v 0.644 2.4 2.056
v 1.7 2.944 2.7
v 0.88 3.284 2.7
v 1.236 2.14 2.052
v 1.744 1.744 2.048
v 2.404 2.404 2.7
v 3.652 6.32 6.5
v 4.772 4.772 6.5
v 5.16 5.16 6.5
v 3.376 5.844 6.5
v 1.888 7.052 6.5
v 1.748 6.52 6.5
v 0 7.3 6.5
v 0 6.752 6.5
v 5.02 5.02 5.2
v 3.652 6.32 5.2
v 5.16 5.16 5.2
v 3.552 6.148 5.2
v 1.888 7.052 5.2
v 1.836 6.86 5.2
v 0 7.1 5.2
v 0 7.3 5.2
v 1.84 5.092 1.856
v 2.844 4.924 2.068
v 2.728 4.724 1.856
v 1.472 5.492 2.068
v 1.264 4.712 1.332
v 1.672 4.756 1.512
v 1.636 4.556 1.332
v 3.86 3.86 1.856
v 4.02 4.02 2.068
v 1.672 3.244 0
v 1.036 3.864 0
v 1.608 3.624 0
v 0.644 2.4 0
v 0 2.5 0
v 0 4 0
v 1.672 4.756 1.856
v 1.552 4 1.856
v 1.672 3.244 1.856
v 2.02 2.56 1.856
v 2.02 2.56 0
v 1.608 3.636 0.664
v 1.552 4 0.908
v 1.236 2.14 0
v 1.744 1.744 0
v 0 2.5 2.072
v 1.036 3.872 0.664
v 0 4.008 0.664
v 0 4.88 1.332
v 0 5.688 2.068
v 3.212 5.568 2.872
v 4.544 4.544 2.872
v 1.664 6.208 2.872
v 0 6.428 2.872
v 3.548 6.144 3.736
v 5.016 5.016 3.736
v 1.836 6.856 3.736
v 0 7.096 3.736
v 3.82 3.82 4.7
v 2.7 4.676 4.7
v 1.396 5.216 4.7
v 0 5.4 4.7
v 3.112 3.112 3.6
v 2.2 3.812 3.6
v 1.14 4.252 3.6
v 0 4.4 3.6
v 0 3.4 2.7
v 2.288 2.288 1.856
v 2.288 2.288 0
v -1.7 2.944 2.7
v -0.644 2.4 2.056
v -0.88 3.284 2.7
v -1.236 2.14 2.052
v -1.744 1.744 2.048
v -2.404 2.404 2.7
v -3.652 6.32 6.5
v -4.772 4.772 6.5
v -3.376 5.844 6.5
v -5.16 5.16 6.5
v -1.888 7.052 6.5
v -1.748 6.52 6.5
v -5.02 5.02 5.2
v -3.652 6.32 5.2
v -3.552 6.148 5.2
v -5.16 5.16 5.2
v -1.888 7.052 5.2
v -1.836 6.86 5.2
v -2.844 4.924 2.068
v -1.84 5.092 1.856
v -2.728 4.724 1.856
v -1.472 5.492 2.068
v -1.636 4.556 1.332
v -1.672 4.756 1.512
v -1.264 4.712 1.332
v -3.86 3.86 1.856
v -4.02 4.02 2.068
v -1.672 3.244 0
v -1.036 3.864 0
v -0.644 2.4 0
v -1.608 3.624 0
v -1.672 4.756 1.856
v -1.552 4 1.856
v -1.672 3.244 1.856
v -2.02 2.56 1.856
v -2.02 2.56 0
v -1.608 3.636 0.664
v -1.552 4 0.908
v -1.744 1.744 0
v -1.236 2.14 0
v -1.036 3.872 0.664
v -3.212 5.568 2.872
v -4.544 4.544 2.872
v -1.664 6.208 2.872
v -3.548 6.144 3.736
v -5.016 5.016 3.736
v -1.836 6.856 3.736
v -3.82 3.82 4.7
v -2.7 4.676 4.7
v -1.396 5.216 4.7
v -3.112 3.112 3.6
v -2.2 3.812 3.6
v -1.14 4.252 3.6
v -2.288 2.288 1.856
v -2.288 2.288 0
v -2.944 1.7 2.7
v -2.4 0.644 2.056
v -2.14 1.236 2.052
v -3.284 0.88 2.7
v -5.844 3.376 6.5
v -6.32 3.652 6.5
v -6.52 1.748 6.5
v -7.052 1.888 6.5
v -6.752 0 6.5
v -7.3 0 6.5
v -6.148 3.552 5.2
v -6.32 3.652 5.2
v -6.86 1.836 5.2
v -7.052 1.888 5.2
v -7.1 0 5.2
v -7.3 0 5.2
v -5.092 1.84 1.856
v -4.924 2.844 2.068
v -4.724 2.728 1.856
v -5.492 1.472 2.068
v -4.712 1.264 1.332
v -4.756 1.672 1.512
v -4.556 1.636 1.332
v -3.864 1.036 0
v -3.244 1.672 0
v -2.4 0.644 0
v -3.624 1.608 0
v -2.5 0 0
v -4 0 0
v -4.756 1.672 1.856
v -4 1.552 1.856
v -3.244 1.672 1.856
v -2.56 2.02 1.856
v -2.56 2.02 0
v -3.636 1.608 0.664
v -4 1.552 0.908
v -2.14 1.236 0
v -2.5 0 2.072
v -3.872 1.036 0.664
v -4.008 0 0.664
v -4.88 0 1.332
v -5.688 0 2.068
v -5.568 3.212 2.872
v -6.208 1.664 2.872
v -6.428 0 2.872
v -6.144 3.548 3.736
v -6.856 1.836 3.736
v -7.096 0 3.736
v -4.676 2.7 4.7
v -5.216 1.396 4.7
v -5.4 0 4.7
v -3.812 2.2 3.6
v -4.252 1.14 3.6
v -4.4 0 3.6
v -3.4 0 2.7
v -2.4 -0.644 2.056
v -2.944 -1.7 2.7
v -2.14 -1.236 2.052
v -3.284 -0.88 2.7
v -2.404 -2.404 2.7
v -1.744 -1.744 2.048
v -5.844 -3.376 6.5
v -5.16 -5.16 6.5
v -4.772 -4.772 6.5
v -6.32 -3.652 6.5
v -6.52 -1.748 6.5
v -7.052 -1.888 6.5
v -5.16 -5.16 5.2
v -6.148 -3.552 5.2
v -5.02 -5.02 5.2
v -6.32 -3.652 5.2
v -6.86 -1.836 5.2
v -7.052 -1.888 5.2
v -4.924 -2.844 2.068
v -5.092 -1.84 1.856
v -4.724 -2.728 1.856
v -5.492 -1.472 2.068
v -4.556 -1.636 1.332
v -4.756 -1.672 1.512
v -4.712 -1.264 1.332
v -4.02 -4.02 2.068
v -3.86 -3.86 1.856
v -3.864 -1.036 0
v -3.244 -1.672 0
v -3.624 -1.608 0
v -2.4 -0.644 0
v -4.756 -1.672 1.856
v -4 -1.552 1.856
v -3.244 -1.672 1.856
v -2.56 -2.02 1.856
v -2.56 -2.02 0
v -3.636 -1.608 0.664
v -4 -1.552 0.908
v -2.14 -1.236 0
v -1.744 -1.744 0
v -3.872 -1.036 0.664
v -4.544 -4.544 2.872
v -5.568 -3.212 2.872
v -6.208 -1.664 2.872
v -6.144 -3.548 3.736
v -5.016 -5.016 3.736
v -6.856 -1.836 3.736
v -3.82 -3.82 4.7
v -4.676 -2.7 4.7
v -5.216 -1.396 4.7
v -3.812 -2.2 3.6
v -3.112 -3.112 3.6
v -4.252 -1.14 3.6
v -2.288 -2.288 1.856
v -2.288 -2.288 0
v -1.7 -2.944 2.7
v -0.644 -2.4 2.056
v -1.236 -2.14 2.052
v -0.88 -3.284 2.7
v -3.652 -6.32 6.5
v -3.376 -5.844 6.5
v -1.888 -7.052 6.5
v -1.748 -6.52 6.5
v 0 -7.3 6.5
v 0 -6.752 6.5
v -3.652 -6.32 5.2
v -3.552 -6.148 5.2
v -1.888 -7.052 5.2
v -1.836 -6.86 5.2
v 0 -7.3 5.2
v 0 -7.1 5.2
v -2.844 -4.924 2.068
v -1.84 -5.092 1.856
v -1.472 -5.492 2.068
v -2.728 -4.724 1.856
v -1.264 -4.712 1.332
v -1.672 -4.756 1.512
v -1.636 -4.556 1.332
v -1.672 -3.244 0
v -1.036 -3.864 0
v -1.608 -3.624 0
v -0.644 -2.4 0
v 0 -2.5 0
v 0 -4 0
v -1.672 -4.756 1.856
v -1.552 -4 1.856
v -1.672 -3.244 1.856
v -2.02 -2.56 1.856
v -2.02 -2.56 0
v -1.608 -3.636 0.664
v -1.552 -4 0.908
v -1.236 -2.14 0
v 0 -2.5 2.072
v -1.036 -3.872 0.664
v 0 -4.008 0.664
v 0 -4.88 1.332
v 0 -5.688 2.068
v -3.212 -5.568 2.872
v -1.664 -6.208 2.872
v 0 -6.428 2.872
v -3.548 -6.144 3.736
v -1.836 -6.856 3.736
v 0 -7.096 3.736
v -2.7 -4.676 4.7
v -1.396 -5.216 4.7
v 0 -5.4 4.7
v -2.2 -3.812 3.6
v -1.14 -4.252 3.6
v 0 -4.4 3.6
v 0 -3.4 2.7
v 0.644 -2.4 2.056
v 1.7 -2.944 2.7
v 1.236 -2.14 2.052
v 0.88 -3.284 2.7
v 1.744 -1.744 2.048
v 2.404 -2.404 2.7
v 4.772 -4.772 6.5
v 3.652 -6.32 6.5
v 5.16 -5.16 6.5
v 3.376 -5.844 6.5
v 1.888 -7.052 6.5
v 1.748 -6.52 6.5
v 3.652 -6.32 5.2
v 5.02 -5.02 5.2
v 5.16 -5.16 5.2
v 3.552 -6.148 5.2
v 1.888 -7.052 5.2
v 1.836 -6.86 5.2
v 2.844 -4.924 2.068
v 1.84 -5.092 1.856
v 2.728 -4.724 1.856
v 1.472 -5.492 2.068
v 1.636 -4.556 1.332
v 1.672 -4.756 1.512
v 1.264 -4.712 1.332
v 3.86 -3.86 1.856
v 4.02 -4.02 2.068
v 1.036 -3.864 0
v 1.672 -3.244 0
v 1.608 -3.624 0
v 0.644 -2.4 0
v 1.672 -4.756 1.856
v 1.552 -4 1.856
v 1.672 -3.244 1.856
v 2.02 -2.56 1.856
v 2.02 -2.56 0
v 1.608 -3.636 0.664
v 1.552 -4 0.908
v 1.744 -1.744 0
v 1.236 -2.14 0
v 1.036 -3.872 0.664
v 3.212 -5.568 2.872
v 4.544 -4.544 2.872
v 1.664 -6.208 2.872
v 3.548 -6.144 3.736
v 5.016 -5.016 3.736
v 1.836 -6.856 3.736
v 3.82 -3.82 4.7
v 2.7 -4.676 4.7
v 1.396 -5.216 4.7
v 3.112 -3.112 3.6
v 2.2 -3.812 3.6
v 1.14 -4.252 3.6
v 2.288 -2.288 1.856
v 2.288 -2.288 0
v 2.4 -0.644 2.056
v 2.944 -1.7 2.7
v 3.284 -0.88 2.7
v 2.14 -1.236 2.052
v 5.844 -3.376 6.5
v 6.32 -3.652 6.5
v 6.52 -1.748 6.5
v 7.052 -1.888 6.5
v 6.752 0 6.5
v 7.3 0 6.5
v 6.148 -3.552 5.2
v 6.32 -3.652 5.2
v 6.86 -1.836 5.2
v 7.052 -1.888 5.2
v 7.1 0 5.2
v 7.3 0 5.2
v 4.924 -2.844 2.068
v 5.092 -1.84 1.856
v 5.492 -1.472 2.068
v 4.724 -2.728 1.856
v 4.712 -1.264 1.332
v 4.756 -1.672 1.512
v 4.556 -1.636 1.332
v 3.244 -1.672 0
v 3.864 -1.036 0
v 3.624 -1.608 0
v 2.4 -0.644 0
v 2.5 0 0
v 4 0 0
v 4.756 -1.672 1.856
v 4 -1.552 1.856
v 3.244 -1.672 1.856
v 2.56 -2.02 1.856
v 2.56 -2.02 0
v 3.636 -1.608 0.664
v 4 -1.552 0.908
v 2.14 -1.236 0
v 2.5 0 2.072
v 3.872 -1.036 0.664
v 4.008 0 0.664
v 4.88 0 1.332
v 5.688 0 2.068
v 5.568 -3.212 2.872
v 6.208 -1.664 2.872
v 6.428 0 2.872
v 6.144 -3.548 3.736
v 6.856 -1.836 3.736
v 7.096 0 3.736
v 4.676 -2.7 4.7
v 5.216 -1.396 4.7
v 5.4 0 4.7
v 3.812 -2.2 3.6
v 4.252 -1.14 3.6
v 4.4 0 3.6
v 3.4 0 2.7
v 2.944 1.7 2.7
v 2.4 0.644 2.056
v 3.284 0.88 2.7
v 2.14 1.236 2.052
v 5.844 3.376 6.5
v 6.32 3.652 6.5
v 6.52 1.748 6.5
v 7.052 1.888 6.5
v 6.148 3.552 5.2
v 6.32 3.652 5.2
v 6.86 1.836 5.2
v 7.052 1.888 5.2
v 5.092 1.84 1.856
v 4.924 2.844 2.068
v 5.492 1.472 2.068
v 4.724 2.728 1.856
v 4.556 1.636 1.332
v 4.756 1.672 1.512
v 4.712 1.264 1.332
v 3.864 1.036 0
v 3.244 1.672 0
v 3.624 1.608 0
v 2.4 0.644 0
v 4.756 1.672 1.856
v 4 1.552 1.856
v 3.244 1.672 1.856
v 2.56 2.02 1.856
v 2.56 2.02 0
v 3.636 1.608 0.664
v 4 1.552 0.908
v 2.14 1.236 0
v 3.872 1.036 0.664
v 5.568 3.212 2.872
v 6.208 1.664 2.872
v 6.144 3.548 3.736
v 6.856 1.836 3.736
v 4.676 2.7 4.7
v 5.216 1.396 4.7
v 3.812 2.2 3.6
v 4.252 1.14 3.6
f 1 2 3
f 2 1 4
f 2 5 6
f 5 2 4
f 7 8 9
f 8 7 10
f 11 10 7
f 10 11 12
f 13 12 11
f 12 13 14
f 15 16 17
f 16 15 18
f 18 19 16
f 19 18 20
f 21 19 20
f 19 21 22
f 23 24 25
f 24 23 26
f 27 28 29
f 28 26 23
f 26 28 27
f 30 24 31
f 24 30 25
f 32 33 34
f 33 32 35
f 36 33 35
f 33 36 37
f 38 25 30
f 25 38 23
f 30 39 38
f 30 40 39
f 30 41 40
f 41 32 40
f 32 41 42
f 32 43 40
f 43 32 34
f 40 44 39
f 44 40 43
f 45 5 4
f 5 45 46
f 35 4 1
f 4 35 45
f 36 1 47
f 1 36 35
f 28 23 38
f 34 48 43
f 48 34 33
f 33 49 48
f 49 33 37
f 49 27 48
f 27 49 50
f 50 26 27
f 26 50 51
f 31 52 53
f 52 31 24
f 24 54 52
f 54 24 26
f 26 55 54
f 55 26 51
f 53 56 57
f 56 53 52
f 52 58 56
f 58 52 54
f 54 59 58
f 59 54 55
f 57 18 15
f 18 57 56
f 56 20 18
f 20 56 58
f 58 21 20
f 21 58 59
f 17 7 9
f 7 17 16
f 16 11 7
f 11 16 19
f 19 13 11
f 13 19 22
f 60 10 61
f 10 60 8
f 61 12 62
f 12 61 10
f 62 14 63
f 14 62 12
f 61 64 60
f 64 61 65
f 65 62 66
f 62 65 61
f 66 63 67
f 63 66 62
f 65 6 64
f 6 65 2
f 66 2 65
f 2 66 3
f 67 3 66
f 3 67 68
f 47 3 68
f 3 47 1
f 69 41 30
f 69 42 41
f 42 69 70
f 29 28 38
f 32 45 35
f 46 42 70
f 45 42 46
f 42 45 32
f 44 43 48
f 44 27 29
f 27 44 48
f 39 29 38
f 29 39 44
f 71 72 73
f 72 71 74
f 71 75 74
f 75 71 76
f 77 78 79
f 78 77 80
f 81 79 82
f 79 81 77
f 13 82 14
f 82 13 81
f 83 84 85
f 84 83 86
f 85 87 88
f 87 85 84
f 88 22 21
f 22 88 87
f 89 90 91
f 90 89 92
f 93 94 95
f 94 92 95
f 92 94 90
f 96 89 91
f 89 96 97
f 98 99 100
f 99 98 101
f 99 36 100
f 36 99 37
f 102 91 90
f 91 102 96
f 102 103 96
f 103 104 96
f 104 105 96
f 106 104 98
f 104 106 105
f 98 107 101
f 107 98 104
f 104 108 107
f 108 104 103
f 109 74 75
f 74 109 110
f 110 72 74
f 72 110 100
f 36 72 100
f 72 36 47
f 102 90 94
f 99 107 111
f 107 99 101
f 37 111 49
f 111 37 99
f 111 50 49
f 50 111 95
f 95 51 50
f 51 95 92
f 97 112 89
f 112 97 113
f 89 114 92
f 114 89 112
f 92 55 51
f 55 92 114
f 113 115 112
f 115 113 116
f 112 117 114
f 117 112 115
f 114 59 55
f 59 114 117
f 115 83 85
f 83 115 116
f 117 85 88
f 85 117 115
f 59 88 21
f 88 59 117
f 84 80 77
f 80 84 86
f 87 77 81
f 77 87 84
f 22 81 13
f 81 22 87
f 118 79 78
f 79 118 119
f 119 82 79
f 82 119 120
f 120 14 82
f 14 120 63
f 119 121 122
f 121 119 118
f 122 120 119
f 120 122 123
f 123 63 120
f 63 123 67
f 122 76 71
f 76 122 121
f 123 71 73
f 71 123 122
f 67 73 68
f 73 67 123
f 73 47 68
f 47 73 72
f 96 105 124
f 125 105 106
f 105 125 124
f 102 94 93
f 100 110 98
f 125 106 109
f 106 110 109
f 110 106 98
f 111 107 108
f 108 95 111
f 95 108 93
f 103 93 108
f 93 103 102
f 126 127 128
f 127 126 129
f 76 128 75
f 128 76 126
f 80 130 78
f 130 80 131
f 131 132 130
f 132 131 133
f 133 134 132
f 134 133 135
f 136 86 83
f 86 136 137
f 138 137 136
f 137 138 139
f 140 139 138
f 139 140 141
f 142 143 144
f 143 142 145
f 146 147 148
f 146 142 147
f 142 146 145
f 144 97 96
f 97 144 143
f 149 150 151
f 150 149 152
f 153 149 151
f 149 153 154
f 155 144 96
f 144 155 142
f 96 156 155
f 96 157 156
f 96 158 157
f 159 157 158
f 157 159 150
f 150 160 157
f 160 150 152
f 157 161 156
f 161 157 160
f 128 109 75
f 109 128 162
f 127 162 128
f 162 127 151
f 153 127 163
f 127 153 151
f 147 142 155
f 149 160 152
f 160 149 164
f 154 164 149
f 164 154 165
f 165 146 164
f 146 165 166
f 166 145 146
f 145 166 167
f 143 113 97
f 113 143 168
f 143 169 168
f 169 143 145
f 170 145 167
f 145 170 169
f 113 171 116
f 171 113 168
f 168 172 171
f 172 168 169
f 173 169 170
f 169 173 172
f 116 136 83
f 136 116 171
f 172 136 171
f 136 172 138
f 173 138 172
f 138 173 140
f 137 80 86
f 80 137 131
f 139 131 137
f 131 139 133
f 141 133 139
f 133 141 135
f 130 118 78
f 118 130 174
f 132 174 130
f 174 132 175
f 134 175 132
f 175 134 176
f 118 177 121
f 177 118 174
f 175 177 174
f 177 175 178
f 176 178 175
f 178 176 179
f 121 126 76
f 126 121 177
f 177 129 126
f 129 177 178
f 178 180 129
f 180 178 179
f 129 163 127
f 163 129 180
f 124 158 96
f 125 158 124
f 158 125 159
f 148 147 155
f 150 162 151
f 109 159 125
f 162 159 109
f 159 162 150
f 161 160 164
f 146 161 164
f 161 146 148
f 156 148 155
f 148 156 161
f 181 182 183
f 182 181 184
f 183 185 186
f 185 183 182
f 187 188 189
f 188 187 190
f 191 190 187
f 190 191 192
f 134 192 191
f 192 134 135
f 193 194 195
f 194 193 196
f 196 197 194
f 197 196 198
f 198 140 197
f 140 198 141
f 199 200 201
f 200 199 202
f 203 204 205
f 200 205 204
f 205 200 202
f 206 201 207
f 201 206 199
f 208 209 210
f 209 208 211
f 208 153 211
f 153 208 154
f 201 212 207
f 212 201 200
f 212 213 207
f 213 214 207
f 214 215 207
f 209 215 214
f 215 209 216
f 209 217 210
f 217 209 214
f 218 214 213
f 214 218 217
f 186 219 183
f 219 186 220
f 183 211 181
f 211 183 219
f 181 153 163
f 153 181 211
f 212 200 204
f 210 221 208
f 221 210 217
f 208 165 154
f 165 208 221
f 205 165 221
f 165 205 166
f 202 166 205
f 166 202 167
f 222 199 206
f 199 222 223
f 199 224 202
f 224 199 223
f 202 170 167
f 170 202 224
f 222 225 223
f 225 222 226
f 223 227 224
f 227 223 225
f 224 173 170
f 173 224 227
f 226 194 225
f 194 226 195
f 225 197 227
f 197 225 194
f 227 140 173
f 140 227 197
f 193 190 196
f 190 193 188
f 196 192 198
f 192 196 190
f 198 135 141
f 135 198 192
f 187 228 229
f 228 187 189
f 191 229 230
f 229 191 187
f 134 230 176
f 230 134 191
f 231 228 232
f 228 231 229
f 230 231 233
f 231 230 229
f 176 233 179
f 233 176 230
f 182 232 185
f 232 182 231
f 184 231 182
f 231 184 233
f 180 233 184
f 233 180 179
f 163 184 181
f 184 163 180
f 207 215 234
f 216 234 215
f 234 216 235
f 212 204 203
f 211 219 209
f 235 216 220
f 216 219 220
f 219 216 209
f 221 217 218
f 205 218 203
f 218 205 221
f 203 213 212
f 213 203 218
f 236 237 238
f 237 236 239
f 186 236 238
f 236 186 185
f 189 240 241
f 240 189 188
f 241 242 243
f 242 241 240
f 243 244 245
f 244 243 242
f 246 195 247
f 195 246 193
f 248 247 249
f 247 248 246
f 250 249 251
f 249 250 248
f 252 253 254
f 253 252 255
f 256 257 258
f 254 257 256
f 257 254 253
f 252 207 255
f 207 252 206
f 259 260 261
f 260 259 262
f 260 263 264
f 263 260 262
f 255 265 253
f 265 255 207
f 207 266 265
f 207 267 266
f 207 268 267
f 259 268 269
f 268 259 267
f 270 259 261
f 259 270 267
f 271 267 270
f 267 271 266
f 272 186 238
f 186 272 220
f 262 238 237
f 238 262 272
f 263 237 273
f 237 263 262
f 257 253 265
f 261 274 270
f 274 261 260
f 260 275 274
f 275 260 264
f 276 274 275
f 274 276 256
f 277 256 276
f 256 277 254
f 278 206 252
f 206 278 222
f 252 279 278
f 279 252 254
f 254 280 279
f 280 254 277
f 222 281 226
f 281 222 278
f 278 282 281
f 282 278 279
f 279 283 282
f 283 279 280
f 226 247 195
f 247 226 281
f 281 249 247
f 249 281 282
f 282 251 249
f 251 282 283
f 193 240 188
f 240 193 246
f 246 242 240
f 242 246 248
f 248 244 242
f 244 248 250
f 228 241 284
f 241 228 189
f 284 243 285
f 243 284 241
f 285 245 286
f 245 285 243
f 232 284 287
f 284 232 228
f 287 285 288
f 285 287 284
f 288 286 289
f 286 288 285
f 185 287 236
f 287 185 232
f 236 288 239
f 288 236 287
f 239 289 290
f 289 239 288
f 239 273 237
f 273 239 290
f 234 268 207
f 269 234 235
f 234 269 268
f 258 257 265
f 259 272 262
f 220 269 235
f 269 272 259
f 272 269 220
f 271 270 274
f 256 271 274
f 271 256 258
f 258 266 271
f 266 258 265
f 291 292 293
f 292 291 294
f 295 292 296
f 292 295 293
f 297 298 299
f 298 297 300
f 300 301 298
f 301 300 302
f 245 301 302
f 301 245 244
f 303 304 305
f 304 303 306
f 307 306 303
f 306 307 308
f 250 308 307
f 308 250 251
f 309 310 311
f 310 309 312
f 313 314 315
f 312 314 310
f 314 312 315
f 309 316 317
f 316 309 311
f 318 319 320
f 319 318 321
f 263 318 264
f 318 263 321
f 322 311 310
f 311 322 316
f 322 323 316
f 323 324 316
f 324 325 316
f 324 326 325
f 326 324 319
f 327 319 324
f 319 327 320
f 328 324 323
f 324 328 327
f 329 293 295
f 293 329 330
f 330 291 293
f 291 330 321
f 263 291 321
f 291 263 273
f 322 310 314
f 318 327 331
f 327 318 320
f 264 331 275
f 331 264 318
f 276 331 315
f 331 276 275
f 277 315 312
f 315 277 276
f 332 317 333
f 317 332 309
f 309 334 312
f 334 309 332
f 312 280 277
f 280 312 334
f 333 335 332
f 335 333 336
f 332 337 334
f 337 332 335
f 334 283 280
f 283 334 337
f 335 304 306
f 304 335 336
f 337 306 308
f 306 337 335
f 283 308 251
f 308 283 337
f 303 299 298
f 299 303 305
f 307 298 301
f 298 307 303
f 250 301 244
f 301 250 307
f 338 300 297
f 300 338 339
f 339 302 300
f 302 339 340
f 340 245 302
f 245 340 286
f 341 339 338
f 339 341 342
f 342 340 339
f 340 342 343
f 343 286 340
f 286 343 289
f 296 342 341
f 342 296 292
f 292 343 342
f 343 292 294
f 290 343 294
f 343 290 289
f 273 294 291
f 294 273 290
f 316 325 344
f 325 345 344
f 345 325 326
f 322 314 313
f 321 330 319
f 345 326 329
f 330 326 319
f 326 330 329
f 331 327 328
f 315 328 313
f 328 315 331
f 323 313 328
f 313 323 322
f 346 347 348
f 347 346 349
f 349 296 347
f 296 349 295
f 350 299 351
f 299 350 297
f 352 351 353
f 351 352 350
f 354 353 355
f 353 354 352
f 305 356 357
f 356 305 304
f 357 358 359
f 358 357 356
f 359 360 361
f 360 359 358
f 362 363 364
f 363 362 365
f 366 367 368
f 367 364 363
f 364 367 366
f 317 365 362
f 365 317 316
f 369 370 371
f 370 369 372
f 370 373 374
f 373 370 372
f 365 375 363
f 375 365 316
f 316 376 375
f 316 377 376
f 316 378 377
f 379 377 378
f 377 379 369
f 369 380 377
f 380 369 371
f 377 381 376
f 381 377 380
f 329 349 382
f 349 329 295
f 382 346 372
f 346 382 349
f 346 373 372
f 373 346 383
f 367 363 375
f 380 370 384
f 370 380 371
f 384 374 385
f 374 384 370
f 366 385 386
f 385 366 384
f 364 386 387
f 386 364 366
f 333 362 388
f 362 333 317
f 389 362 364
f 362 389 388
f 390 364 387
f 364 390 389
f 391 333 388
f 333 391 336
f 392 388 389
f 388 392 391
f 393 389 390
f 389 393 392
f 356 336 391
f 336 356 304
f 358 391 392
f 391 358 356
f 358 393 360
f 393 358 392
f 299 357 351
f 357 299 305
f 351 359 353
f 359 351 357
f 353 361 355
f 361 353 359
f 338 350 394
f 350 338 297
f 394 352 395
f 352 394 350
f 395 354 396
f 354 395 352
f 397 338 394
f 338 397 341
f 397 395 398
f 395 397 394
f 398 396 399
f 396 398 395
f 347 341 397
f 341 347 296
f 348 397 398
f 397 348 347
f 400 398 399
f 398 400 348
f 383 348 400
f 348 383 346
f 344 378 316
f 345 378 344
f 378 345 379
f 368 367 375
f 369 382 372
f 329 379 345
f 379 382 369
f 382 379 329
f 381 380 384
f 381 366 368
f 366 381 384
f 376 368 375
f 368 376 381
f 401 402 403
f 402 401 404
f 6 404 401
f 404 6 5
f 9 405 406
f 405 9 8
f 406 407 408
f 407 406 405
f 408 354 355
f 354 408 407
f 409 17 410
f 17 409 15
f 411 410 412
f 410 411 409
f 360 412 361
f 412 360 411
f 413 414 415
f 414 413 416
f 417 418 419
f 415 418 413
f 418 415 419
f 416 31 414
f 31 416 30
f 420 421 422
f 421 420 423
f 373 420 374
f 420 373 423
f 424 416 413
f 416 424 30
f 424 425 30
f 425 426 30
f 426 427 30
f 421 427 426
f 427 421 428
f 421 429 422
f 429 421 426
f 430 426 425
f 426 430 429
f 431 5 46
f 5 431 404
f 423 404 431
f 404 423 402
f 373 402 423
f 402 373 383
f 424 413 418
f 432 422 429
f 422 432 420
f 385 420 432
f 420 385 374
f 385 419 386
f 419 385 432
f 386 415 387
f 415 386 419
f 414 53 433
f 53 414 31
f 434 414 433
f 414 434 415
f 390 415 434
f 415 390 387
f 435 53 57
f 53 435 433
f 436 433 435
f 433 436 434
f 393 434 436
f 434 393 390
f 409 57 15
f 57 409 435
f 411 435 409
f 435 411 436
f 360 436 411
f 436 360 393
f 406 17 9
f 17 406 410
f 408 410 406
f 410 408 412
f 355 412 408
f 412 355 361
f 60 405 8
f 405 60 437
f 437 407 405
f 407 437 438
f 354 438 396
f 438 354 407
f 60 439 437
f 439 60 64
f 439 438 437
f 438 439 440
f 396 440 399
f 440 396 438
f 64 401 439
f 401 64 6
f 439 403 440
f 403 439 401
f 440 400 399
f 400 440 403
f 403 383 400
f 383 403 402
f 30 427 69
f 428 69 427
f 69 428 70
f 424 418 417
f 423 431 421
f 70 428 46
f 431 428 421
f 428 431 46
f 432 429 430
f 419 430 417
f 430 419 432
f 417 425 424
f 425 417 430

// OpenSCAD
use <../lib.scad>
use <s/902s01.scad>
function ldraw_lib__902() = [
// 0 Electric Light Reflector Round  2 x  2 x  0.667
// 0 Name: 902.dat
// 0 Author: Andy Westrate [westrate]
// 0 !LDRAW_ORG Part UPDATE 2012-01
// 0 !LICENSE Licensed under CC BY 4.0 : see CAreadme.txt
// 
// 0 BFC CERTIFY CCW
  [0,"BFC","CERTIFY"],
  [0,"BFC","CCW"],
// 
// 0 !CATEGORY Dish
// 0 !KEYWORDS BrickLink x85, Rebrickable 71128
// 
// 0 !HISTORY 2007-08-25 {LEGO Universe Team} Original part shape
// 0 !HISTORY 2009-05-06 [westrate] File preparation for LDraw Parts Tracker
// 0 !HISTORY 2012-03-30 [PTadmin] Official Update 2012-01
// 
// 
// 1 16 0 0 0 1 0 0 0 1 0 0 0 1 s\902s01.dat
  [1,16,0,0,0,1,0,0,0,1,0,0,0,1, ldraw_lib__s__902s01()],
// 1 16 0 0 0 -1 0 0 0 1 0 0 0 1 s\902s01.dat
  [1,16,0,0,0,-1,0,0,0,1,0,0,0,1, ldraw_lib__s__902s01()],
// 1 16 0 0 0 0 0 -1 0 1 0 1 0 0 s\902s01.dat
  [1,16,0,0,0,0,0,-1,0,1,0,1,0,0, ldraw_lib__s__902s01()],
// 1 16 0 0 0 0 0 -1 0 1 0 -1 0 0 s\902s01.dat
  [1,16,0,0,0,0,0,-1,0,1,0,-1,0,0, ldraw_lib__s__902s01()],
// 1 16 0 0 0 -1 0 0 0 1 0 0 0 -1 s\902s01.dat
  [1,16,0,0,0,-1,0,0,0,1,0,0,0,-1, ldraw_lib__s__902s01()],
// 1 16 0 0 0 1 0 0 0 1 0 0 0 -1 s\902s01.dat
  [1,16,0,0,0,1,0,0,0,1,0,0,0,-1, ldraw_lib__s__902s01()],
// 1 16 0 0 0 0 0 1 0 1 0 -1 0 0 s\902s01.dat
  [1,16,0,0,0,0,0,1,0,1,0,-1,0,0, ldraw_lib__s__902s01()],
// 1 16 0 0 0 0 0 1 0 1 0 1 0 0 s\902s01.dat
  [1,16,0,0,0,0,0,1,0,1,0,1,0,0, ldraw_lib__s__902s01()],
// 0
];
module ldraw_lib__902(step=0, col=false, unit=2/5, alt=false, line=0.2, solid=!$preview)
    makepoly(ldraw_lib__902(), step=step, col=col, unit=unit, alt=alt, line=line, solid=solid);
ldraw_lib__902(line=0.2);
